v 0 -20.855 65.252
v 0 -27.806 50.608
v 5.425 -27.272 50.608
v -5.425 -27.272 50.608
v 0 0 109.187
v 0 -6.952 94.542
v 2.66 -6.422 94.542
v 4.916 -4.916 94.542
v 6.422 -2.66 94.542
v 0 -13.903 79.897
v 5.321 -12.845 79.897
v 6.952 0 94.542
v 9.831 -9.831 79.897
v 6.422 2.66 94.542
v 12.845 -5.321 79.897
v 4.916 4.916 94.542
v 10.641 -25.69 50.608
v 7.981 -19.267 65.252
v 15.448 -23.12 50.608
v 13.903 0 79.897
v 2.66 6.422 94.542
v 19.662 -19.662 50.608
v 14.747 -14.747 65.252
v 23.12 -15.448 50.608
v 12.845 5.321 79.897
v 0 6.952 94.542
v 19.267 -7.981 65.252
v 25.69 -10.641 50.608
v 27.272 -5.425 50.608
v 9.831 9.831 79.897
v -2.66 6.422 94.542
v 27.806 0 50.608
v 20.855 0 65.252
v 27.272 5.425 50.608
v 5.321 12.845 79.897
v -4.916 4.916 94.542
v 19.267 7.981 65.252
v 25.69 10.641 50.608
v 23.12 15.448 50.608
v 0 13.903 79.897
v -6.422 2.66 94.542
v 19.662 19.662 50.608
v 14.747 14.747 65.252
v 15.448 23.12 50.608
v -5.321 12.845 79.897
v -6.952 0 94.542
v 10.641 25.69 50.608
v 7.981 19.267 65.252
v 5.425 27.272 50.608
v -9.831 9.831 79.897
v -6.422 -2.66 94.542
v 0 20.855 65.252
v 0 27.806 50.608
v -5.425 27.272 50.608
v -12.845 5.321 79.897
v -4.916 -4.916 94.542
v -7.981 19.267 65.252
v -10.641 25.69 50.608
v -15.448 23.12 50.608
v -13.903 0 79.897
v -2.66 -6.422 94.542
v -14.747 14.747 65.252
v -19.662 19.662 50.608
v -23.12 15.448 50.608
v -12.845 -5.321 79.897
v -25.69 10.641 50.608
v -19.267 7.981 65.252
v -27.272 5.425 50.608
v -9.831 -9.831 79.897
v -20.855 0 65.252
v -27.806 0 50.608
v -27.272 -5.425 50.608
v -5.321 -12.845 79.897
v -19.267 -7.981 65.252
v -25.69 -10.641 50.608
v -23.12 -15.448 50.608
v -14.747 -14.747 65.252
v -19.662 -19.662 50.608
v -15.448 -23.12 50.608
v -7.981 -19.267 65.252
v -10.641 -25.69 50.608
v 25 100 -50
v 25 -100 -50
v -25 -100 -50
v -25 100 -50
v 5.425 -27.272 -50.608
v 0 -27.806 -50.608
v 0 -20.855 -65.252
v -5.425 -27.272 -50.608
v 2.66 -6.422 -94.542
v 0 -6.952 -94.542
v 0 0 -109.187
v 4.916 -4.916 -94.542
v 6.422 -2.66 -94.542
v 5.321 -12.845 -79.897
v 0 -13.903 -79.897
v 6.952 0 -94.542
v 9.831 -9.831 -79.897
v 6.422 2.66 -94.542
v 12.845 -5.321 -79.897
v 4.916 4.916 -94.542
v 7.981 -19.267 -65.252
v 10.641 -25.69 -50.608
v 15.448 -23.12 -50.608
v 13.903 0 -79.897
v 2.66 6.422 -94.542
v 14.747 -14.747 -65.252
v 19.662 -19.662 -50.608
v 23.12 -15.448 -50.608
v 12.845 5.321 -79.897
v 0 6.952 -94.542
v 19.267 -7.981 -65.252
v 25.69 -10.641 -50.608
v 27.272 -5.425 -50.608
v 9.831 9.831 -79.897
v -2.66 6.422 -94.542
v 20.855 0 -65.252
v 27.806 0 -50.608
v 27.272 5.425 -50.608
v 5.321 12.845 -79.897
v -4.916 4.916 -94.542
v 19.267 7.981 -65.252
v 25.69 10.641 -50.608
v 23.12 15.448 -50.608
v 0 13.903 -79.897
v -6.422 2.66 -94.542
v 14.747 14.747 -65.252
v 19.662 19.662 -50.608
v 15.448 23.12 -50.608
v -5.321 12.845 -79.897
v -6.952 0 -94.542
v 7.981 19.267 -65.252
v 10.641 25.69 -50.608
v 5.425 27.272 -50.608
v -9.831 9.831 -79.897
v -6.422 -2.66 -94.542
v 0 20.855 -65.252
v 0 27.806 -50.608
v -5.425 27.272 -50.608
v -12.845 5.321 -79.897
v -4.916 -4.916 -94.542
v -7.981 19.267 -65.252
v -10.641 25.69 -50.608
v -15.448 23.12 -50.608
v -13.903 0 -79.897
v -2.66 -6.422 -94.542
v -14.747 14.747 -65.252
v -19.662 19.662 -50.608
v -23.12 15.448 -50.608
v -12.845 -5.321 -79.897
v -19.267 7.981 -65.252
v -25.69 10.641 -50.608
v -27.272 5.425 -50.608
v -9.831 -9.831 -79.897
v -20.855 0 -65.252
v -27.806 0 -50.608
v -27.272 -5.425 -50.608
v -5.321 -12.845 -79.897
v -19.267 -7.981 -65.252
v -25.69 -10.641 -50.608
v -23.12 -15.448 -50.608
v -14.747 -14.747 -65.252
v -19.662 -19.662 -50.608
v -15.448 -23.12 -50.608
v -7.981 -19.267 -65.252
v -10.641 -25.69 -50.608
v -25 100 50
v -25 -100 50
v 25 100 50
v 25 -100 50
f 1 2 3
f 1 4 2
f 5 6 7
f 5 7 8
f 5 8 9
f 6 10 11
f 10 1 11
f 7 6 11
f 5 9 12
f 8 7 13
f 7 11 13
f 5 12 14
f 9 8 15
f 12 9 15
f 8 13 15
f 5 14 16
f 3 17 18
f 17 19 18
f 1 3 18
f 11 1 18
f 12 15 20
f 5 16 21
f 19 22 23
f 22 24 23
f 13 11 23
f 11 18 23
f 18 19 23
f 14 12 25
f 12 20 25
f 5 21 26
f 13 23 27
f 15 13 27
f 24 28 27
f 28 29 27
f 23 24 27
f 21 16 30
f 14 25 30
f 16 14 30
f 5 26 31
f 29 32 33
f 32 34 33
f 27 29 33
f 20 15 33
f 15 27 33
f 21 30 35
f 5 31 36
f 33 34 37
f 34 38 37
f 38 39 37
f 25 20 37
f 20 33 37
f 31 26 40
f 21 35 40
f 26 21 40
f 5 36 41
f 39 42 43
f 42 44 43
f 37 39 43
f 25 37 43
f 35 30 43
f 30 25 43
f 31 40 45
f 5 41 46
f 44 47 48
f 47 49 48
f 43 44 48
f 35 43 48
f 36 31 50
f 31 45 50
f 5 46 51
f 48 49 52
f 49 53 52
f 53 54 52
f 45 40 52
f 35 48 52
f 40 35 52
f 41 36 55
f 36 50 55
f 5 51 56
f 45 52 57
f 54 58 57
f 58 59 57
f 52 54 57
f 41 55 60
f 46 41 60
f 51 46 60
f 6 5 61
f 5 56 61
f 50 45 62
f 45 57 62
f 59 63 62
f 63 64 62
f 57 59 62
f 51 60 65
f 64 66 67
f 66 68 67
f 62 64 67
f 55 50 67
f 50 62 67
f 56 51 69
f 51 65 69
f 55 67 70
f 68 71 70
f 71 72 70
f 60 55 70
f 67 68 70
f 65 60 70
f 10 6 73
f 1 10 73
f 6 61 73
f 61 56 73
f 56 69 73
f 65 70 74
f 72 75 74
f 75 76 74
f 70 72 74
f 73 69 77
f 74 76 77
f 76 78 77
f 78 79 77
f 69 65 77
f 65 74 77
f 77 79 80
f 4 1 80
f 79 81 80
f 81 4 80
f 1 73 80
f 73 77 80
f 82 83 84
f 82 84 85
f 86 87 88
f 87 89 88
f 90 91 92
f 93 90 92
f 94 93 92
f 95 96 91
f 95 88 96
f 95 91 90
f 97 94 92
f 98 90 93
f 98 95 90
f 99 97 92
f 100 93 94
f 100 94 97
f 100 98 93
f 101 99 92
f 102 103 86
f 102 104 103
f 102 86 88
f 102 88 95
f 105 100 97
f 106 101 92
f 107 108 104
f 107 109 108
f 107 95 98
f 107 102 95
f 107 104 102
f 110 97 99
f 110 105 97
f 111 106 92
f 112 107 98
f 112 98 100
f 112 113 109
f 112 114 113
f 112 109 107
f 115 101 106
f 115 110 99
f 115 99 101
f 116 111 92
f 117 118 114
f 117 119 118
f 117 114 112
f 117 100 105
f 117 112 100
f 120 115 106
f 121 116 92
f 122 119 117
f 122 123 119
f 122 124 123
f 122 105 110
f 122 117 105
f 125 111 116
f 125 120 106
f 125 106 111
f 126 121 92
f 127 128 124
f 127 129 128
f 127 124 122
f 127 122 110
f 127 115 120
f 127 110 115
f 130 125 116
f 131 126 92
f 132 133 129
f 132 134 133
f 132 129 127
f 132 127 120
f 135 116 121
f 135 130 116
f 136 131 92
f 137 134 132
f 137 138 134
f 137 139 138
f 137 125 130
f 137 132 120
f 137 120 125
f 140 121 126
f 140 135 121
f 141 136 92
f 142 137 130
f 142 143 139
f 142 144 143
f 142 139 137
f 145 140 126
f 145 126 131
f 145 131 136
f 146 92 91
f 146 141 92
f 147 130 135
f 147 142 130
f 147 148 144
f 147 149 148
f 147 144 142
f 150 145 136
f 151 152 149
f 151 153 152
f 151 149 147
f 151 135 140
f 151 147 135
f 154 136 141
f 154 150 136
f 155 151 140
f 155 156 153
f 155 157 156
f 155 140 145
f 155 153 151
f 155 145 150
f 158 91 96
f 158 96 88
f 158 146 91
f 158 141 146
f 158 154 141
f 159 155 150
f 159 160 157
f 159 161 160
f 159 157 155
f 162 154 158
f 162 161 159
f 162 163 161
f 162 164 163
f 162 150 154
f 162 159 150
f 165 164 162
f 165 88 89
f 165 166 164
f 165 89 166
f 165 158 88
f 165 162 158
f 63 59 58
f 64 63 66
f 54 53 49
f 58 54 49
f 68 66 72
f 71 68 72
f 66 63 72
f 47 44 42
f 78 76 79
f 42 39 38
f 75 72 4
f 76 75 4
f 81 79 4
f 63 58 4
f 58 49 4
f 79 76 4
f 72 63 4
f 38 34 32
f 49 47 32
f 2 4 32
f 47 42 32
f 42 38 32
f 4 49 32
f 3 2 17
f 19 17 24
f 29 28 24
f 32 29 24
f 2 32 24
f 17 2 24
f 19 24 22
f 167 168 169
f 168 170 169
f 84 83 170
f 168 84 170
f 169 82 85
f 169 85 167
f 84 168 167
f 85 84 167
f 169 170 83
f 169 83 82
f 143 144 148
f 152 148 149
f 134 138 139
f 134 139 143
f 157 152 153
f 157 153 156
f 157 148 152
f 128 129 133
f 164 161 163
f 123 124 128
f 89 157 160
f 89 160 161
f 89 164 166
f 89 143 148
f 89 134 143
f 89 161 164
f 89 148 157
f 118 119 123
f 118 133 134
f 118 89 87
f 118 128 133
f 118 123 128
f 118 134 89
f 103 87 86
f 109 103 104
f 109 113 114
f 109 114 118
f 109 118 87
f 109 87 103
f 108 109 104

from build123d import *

# Parameters (mm, degrees)
F0_W     = 200
F0_H     = 100
F1_DEPTH = 25


with BuildPart() as f1:
    # F0 (on Right) → F1 (new body, symmetric)
    with BuildSketch(Plane.YZ):
        Rectangle(F0_W, F0_H)
    extrude(amount=F1_DEPTH, both=True)


with BuildPart() as f3:
    # F2 (on Right) → F3 (revolve)
    with BuildSketch(Plane.YZ):
        Polygon((-27.806457, 50.607752), (0, 50.607752), (0, 109.186694), align=None)
    revolve(axis=Axis((0, 0, 79.897223), (0, 0, 1)))


with BuildPart() as f4_1:
    # F4: instance of F3
    add(f3.part.mirror(Plane.XY))


solid = Compound([f1.part, f3.part, f4_1.part])
